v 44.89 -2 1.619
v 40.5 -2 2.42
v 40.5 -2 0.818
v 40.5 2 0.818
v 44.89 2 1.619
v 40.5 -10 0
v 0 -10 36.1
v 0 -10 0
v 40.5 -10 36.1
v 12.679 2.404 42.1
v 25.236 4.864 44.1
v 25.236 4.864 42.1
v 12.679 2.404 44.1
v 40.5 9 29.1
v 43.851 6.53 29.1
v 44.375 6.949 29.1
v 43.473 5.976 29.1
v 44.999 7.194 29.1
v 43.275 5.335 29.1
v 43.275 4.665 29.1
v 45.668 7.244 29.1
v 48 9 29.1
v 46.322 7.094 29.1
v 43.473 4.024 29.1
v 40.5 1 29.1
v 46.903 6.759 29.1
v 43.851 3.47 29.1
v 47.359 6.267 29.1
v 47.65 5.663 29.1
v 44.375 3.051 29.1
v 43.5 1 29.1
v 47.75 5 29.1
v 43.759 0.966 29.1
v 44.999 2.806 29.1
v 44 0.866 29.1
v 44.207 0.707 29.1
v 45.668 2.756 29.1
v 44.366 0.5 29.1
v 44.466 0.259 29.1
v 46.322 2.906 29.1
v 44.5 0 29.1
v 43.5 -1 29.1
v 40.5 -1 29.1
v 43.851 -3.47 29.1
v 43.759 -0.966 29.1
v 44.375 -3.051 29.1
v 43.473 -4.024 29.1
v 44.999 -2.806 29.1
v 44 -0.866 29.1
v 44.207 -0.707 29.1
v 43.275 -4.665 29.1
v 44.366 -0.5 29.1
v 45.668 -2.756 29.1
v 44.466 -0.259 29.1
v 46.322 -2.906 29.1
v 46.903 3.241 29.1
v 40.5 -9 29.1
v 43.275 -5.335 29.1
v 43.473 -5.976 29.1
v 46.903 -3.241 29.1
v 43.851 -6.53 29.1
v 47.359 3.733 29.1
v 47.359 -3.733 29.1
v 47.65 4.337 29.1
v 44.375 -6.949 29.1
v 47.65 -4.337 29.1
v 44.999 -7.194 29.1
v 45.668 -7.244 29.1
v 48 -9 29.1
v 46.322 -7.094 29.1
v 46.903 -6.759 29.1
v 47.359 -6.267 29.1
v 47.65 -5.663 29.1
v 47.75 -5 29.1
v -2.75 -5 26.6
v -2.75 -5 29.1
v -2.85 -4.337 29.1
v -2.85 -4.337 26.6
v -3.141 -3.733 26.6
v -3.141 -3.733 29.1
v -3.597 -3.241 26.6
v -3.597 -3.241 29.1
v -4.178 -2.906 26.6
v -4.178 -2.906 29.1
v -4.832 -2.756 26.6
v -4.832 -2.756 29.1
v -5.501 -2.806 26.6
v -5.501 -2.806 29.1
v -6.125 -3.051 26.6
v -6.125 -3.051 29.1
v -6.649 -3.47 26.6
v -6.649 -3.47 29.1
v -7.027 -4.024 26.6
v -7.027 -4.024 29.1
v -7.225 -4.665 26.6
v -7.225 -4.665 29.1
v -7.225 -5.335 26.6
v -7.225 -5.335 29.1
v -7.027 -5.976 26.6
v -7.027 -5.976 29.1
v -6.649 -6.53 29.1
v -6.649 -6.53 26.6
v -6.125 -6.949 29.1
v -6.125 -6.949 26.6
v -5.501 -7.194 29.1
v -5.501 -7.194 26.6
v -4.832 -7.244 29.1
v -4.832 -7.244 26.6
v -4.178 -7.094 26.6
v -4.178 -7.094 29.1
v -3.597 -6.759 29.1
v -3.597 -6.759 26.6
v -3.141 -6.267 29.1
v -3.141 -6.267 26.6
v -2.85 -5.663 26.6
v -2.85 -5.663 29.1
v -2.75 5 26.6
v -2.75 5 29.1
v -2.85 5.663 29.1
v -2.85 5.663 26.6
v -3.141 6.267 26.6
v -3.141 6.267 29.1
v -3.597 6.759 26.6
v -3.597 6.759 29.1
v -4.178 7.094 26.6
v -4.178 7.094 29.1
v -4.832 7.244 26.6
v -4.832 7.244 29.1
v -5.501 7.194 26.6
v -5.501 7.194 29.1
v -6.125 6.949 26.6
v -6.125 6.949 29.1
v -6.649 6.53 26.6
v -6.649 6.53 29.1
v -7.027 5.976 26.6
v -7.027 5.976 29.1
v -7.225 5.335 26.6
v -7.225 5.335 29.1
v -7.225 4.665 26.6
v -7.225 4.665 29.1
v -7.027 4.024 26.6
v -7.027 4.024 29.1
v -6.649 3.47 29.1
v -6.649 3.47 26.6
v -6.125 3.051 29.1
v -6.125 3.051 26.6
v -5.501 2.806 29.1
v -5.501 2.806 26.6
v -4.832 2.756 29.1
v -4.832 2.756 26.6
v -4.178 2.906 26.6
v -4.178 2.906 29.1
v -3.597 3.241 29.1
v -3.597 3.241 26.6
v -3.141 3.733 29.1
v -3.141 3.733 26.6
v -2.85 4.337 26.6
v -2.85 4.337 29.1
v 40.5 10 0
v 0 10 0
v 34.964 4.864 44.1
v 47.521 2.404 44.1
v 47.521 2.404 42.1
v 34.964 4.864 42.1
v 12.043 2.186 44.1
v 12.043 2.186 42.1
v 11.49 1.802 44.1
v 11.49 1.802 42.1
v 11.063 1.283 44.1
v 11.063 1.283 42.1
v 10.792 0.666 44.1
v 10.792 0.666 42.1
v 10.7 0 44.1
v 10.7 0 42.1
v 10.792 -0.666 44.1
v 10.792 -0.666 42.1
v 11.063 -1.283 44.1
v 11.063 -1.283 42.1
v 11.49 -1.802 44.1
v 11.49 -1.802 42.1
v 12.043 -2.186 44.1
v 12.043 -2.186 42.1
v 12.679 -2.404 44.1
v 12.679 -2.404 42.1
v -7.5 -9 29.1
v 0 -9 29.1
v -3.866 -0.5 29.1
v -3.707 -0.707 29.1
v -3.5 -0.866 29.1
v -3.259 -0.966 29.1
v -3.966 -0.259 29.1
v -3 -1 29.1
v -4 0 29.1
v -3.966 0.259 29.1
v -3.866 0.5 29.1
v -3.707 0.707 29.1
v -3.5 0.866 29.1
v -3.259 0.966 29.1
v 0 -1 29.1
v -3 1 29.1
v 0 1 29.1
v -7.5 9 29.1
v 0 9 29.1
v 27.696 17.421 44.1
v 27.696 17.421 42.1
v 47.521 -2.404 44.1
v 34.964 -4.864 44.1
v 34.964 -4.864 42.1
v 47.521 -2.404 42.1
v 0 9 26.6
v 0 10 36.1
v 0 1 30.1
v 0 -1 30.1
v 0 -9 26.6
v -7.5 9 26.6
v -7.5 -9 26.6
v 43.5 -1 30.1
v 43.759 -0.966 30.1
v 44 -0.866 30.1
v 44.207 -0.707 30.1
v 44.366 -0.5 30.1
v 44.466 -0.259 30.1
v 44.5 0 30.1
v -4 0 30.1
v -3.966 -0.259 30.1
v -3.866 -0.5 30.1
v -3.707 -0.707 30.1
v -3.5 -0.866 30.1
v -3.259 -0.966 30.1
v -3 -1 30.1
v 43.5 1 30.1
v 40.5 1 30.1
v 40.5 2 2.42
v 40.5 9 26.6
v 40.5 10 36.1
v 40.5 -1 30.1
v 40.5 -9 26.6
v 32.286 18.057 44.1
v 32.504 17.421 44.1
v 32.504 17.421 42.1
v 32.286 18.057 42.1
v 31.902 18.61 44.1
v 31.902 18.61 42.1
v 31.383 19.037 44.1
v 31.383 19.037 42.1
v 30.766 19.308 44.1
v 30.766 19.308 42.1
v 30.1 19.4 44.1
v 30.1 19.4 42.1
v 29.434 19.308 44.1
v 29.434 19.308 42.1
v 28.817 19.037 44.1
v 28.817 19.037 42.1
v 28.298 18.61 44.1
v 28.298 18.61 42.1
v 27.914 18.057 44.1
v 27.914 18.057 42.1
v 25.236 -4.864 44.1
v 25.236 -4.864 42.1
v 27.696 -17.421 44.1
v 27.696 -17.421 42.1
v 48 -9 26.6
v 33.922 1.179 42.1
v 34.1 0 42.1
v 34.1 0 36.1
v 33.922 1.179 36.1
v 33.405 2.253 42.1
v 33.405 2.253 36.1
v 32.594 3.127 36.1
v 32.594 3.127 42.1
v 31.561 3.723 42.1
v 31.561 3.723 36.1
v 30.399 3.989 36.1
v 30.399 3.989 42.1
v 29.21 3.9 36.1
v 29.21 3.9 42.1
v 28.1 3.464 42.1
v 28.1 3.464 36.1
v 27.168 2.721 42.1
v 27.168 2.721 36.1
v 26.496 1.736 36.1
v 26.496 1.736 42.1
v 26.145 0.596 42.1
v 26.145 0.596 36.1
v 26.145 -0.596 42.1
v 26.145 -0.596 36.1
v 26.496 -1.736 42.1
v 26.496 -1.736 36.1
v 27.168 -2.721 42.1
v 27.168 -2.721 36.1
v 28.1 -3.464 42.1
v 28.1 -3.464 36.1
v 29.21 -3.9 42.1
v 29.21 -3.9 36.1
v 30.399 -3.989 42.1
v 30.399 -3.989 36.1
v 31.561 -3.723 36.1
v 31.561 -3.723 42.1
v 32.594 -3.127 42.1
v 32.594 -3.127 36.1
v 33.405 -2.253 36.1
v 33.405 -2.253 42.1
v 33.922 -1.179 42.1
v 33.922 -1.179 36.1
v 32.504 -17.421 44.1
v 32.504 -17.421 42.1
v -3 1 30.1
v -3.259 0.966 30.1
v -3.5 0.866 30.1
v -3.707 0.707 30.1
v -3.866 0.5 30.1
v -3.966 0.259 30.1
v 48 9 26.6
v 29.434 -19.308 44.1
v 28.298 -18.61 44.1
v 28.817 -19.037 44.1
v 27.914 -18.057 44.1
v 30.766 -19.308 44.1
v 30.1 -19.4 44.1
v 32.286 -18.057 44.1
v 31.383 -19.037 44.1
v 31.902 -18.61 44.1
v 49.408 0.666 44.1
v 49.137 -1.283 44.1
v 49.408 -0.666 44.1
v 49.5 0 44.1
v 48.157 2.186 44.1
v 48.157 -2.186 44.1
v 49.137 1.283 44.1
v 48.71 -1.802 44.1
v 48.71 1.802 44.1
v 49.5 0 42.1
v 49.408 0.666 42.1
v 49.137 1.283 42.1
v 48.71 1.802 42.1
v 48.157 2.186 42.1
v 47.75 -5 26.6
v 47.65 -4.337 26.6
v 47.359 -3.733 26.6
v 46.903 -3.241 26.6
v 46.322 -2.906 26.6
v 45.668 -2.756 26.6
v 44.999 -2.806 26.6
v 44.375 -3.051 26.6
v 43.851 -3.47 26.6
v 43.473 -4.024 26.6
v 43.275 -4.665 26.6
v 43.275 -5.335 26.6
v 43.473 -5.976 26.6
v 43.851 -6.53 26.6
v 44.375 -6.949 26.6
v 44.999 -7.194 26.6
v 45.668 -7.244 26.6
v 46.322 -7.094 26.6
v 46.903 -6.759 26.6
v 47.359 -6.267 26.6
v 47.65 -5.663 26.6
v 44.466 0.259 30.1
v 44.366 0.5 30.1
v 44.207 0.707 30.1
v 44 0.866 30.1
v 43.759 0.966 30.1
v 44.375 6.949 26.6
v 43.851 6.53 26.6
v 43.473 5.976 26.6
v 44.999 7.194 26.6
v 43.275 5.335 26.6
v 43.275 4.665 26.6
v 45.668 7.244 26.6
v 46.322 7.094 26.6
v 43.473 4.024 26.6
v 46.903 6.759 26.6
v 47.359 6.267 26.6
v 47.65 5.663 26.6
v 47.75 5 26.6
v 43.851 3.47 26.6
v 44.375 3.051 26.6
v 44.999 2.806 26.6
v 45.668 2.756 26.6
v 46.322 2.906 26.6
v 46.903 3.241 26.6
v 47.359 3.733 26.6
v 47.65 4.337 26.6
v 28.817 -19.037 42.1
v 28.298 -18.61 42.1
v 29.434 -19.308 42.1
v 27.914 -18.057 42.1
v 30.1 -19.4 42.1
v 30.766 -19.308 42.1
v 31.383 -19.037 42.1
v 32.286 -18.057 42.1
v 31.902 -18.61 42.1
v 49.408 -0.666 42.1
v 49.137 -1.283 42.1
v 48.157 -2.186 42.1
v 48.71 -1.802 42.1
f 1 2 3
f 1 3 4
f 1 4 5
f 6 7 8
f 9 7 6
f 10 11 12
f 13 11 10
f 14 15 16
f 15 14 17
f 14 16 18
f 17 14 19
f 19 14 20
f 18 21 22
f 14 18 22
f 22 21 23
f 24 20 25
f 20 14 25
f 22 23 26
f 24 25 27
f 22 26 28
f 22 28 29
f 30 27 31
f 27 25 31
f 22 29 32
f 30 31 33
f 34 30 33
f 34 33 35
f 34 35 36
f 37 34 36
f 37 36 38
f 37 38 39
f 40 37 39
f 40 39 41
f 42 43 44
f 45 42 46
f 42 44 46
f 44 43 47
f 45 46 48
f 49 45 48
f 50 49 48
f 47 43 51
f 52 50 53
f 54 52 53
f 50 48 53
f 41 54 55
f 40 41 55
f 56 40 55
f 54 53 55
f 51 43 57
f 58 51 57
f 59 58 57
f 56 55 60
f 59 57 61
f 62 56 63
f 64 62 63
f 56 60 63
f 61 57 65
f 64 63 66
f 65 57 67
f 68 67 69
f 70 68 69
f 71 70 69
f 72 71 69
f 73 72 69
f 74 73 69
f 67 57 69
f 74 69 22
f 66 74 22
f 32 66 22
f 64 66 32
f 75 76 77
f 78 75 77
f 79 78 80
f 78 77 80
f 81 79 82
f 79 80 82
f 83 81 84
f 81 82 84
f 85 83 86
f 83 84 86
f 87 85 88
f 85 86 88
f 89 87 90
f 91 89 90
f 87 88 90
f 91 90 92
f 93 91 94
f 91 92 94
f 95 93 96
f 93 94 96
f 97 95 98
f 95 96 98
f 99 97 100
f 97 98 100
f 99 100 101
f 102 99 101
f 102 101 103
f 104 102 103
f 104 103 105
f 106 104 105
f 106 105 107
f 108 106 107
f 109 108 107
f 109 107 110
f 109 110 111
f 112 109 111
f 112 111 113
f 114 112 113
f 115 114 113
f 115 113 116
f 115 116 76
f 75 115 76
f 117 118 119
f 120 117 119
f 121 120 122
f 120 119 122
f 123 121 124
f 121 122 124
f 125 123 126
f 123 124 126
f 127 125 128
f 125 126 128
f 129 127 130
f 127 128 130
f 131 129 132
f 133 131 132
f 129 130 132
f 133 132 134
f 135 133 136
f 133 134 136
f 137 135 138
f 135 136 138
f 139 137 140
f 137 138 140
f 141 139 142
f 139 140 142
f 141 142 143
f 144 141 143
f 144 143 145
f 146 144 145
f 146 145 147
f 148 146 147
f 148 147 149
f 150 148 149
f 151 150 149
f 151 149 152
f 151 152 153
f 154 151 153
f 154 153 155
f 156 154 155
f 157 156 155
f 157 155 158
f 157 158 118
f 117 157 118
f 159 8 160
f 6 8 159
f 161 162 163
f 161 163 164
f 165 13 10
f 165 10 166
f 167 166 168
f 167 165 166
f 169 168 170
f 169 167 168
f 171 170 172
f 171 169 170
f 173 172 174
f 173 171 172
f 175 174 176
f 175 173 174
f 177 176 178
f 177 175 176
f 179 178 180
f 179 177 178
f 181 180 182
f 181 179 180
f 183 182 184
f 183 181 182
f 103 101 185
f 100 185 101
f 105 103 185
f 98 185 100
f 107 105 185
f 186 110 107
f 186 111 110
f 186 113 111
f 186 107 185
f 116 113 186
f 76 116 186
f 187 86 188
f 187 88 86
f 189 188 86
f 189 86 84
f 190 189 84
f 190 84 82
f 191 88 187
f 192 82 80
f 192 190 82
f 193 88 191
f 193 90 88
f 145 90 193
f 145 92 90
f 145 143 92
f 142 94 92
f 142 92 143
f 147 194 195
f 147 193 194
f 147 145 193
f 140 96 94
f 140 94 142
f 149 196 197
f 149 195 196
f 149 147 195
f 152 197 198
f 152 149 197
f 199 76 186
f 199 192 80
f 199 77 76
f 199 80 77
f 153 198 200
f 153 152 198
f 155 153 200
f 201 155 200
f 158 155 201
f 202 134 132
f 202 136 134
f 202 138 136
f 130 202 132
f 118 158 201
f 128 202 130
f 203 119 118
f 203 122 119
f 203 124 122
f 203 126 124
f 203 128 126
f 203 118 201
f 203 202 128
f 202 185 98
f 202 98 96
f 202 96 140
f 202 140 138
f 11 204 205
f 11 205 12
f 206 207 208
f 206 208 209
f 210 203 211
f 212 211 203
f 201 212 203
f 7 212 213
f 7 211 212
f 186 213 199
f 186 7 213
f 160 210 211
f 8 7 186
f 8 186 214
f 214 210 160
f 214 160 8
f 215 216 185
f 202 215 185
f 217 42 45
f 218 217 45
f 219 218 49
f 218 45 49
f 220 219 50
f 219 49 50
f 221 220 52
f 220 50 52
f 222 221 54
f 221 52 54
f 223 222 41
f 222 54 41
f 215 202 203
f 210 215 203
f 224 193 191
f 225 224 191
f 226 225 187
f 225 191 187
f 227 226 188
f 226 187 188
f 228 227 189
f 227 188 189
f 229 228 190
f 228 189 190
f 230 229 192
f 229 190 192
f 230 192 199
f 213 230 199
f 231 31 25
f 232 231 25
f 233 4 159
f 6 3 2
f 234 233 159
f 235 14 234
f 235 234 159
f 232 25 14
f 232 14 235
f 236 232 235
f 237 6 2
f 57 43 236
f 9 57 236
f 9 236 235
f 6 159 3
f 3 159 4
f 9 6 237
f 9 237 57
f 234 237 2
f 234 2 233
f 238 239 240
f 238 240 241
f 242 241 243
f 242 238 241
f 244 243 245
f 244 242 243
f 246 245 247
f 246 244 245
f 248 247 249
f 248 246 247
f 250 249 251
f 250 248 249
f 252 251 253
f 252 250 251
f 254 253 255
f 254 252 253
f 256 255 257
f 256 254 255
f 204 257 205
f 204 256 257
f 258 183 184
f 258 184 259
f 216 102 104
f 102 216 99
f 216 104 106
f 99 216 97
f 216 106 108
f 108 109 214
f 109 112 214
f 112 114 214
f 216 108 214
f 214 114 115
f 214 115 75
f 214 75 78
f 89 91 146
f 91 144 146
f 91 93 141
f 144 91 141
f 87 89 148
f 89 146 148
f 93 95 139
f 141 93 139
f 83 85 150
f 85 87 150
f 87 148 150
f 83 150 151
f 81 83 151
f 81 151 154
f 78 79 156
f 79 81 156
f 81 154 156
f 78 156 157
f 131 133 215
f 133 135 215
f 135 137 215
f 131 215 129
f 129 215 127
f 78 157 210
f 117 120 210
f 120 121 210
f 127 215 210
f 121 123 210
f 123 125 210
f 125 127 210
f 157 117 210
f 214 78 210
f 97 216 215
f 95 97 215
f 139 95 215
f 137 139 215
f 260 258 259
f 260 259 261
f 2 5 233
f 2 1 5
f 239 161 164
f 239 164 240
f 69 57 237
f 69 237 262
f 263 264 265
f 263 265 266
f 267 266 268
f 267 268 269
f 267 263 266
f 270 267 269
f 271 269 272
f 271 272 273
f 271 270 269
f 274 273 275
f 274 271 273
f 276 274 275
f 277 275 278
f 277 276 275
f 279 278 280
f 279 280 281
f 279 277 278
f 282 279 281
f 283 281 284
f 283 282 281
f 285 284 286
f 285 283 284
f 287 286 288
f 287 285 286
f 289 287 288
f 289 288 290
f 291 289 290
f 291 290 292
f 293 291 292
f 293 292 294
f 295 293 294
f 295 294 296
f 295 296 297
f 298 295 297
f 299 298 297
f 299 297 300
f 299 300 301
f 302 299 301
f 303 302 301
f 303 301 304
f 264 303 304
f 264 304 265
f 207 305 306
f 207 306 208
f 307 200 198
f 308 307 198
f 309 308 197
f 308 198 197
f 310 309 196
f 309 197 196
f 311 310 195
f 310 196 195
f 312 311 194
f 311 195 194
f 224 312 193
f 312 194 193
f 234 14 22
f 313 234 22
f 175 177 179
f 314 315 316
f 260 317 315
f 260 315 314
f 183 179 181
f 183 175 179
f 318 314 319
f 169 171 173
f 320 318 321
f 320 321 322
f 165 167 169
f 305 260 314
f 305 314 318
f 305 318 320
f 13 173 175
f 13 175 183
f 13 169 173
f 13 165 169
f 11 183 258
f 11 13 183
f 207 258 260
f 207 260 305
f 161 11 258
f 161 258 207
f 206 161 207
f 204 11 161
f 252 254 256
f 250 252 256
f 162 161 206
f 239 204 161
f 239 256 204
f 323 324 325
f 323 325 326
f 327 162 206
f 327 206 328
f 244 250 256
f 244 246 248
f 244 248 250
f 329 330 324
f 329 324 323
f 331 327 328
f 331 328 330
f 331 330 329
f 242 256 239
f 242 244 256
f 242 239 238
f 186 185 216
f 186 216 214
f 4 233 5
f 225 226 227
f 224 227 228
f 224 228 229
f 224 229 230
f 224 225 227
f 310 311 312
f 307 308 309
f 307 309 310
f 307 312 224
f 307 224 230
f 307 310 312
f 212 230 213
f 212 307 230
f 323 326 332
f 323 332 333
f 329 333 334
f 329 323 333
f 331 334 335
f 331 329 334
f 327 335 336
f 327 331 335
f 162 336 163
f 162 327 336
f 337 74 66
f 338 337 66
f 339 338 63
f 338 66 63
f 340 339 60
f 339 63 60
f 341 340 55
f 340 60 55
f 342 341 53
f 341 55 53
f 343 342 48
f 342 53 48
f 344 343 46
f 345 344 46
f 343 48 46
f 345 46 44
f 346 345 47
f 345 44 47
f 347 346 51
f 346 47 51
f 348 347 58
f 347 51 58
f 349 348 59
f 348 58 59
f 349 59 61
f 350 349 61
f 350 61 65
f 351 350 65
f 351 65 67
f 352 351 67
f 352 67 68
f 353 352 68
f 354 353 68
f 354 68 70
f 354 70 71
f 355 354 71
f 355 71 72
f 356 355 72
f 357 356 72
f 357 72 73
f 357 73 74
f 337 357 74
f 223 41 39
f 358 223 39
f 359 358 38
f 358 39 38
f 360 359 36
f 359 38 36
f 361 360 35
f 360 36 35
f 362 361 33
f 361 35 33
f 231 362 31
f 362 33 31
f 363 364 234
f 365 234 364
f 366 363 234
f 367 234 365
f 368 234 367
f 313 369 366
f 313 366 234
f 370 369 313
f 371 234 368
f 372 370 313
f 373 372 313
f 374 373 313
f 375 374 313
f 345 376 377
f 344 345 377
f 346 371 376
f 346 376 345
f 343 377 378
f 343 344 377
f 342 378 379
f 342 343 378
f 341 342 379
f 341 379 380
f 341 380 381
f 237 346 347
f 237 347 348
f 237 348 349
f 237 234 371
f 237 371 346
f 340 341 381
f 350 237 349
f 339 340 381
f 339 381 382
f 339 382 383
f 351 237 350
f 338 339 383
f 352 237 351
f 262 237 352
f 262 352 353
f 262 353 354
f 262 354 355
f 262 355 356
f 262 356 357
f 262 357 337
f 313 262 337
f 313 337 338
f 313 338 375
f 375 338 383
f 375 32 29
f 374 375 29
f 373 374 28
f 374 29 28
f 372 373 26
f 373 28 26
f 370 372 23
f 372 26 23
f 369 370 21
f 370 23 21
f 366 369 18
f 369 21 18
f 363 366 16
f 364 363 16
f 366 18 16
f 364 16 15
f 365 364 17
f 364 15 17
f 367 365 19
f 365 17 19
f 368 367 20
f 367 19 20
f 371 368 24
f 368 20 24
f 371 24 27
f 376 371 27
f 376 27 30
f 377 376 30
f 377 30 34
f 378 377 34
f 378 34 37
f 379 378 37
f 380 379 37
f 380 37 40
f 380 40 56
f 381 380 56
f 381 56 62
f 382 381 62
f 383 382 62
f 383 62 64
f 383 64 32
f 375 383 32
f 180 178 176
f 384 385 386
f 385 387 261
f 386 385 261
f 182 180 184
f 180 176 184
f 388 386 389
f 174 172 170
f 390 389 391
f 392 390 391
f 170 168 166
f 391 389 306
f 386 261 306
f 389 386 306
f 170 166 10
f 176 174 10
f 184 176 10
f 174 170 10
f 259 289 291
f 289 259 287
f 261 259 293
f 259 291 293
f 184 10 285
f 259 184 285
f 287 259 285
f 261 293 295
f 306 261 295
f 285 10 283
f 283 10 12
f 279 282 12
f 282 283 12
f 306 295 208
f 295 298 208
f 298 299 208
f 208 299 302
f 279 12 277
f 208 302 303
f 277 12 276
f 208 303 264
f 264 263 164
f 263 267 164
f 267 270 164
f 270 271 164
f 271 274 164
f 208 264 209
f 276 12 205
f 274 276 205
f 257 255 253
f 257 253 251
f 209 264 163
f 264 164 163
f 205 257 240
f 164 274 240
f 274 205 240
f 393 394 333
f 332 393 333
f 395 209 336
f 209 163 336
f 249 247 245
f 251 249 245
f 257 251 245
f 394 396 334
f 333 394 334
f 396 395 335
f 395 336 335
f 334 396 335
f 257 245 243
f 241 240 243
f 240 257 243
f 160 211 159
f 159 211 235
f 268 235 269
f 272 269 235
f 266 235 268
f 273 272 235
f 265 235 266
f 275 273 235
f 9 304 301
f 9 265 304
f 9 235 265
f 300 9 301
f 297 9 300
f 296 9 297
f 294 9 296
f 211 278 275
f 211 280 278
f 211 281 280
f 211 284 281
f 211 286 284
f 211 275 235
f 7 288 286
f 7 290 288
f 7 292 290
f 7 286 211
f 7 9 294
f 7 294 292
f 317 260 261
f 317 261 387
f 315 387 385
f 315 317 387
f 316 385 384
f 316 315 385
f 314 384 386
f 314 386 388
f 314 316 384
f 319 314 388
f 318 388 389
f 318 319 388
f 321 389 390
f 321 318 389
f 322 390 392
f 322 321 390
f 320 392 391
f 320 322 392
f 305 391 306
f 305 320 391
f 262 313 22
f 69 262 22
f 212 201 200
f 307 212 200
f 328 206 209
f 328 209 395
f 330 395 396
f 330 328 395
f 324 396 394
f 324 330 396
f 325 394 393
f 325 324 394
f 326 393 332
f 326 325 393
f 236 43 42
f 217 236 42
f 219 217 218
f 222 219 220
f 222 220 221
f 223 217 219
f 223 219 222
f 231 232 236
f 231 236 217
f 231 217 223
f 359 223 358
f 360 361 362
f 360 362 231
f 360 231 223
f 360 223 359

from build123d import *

# Parameters (mm, degrees)
F1_DEPTH  = 10
F0_W      = 7.5
F0_H      = 2.5
F2_DEPTH  = 9
F3_DEPTH  = 2
F5_R      = 4
F6_DEPTH  = 8
F7_DEPTH  = 2
F9_D      = 4.5
F9_DEPTH  = 29.101
F10_DEPTH = 1


with BuildPart() as f1:
    # F0 (on Front) → F1 (new body, symmetric)
    with BuildSketch(Plane.XZ):
        Polygon((0, 26.6), (0, 0), (40.5, 0), (40.5, 0.8176856209), (40.5, 2.4204463698), (40.5, 26.6), (40.5, 29.1), (40.5, 36.1), (0, 36.1), (0, 29.1), align=None)
    extrude(amount=F1_DEPTH, both=True)

    # F0 (on Front) → F2 (join, symmetric)
    with BuildSketch(Plane.XZ):
        with Locations((-3.75, 27.85)):
            Rectangle(F0_W, F0_H)
        with Locations((44.25, 27.85)):
            Rectangle(F0_W, F0_H)
    extrude(amount=F2_DEPTH, both=True)

    # F0 (on Front) → F3 (join, symmetric)
    with BuildSketch(Plane.XZ):
        Polygon((40.5, 2.4204463698), (40.5, 0.8176856209), (44.8900647461, 1.6190659953), align=None)
    extrude(amount=F3_DEPTH, both=True)

    # F5 (on plane+point) → F6 (join, through all)
    with BuildSketch(Plane.XY.offset(44.1)):
        with Locations((30.1, 0)):
            Circle(F5_R)
    extrude(amount=-F6_DEPTH)

    # F5 (on plane+point) → F7 (join)
    with BuildSketch(Plane.XY.offset(44.1)):
        with BuildLine():
            ThreePointArc((32.55, 16.95), (29.8633773569, 14.5114533581), (27.6957063471, 17.4210329401))
            Line((27.6957063471, 17.4210329401), (25.2356786223, 4.8643213777))
            Line((25.2356786223, 4.8643213777), (12.6789670858, 2.404293658))
            ThreePointArc((12.6789670858, 2.404293658), (14.7069954014, 1.8916303338), (15.6, 0))
            ThreePointArc((15.6, 0), (14.7069954014, -1.8916303338), (12.6789670858, -2.404293658))
            Line((12.6789670858, -2.404293658), (25.2356786223, -4.8643213777))
            Line((25.2356786223, -4.8643213777), (27.6957063471, -17.4210329401))
            ThreePointArc((27.6957063471, -17.4210329401), (29.8633773569, -14.5114533581), (32.55, -16.95))
            ThreePointArc((32.55, -16.95), (32.5385466419, -17.1866226431), (32.5042936529, -17.4210329401))
            Line((32.5042936529, -17.4210329401), (34.9643213777, -4.8643213777))
            Line((34.9643213777, -4.8643213777), (47.5210328982, -2.4042936611))
            ThreePointArc((47.5210328982, -2.4042936611), (44.6, 8.2e-09), (47.5210329142, 2.404293658))
            Line((47.5210329142, 2.404293658), (34.9643213777, 4.8643213777))
            Line((34.9643213777, 4.8643213777), (32.5042935187, 17.4210336249))
            ThreePointArc((32.5042935187, 17.4210336249), (32.5385466082, 17.1866229903), (32.55, 16.95))
        make_face()
        with Locations((30.1, 0)):
            Circle(F5_R, mode=Mode.SUBTRACT)
        with BuildLine():
            ThreePointArc((32.5042935187, 17.4210336249), (30.0999996511, 19.4), (27.6957063471, 17.4210329401))
            ThreePointArc((27.6957063471, 17.4210329401), (29.8633773569, 14.5114533581), (32.55, 16.95))
            ThreePointArc((32.55, 16.95), (32.5385466082, 17.1866229903), (32.5042935187, 17.4210336249))
        make_face()
        with BuildLine():
            ThreePointArc((49.5, 0), (48.9416303338, 1.5569954014), (47.5210329142, 2.404293658))
            ThreePointArc((47.5210329142, 2.404293658), (44.6, 8.2e-09), (47.5210328982, -2.4042936611))
            ThreePointArc((47.5210328982, -2.4042936611), (48.9416303286, -1.5569954077), (49.5, 0))
        make_face()
        with BuildLine():
            ThreePointArc((32.55, -16.95), (29.8633773569, -14.5114533581), (27.6957063471, -17.4210329401))
            ThreePointArc((27.6957063471, -17.4210329401), (30.1, -19.4), (32.5042936529, -17.4210329401))
            ThreePointArc((32.5042936529, -17.4210329401), (32.5385466419, -17.1866226431), (32.55, -16.95))
        make_face()
        with BuildLine():
            ThreePointArc((15.6, 0), (14.7069954014, 1.8916303338), (12.6789670858, 2.404293658))
            ThreePointArc((12.6789670858, 2.404293658), (10.7, 0), (12.6789670858, -2.404293658))
            ThreePointArc((12.6789670858, -2.404293658), (14.7069954014, -1.8916303338), (15.6, 0))
        make_face()
        with Locations((30.1, 0)):
            Circle(F5_R)
    extrude(amount=-F7_DEPTH)

    # F9 (through all, one way)
    with BuildSketch(Plane.XY.offset(29.1)):
        with Locations((-5, 5), (-5, -5), (45.5, 5), (45.5, -5)):
            Circle(F9_D / 2)
    extrude(amount=-F9_DEPTH, mode=Mode.SUBTRACT)

    # F8 (on face) → F10 (join)
    with BuildSketch(Plane.XY.offset(29.1)):
        with BuildLine():
            Line((0, -1), (0, 1))
            Line((0, 1), (-3, 1))
            ThreePointArc((-3, 1), (-3.7071067812, 0.7071067812), (-4, 0))
            ThreePointArc((-4, 0), (-3.7071067812, -0.7071067812), (-3, -1))
            Line((-3, -1), (0, -1))
        make_face()
        with BuildLine():
            Line((43.5, 1), (40.5, 1))
            Line((40.5, 1), (40.5, -1))
            Line((40.5, -1), (43.5, -1))
            ThreePointArc((43.5, -1), (44.2071067812, -0.7071067812), (44.5, 0))
            ThreePointArc((44.5, 0), (44.2071067812, 0.7071067812), (43.5, 1))
        make_face()
    extrude(amount=F10_DEPTH)


solid = f1.part
